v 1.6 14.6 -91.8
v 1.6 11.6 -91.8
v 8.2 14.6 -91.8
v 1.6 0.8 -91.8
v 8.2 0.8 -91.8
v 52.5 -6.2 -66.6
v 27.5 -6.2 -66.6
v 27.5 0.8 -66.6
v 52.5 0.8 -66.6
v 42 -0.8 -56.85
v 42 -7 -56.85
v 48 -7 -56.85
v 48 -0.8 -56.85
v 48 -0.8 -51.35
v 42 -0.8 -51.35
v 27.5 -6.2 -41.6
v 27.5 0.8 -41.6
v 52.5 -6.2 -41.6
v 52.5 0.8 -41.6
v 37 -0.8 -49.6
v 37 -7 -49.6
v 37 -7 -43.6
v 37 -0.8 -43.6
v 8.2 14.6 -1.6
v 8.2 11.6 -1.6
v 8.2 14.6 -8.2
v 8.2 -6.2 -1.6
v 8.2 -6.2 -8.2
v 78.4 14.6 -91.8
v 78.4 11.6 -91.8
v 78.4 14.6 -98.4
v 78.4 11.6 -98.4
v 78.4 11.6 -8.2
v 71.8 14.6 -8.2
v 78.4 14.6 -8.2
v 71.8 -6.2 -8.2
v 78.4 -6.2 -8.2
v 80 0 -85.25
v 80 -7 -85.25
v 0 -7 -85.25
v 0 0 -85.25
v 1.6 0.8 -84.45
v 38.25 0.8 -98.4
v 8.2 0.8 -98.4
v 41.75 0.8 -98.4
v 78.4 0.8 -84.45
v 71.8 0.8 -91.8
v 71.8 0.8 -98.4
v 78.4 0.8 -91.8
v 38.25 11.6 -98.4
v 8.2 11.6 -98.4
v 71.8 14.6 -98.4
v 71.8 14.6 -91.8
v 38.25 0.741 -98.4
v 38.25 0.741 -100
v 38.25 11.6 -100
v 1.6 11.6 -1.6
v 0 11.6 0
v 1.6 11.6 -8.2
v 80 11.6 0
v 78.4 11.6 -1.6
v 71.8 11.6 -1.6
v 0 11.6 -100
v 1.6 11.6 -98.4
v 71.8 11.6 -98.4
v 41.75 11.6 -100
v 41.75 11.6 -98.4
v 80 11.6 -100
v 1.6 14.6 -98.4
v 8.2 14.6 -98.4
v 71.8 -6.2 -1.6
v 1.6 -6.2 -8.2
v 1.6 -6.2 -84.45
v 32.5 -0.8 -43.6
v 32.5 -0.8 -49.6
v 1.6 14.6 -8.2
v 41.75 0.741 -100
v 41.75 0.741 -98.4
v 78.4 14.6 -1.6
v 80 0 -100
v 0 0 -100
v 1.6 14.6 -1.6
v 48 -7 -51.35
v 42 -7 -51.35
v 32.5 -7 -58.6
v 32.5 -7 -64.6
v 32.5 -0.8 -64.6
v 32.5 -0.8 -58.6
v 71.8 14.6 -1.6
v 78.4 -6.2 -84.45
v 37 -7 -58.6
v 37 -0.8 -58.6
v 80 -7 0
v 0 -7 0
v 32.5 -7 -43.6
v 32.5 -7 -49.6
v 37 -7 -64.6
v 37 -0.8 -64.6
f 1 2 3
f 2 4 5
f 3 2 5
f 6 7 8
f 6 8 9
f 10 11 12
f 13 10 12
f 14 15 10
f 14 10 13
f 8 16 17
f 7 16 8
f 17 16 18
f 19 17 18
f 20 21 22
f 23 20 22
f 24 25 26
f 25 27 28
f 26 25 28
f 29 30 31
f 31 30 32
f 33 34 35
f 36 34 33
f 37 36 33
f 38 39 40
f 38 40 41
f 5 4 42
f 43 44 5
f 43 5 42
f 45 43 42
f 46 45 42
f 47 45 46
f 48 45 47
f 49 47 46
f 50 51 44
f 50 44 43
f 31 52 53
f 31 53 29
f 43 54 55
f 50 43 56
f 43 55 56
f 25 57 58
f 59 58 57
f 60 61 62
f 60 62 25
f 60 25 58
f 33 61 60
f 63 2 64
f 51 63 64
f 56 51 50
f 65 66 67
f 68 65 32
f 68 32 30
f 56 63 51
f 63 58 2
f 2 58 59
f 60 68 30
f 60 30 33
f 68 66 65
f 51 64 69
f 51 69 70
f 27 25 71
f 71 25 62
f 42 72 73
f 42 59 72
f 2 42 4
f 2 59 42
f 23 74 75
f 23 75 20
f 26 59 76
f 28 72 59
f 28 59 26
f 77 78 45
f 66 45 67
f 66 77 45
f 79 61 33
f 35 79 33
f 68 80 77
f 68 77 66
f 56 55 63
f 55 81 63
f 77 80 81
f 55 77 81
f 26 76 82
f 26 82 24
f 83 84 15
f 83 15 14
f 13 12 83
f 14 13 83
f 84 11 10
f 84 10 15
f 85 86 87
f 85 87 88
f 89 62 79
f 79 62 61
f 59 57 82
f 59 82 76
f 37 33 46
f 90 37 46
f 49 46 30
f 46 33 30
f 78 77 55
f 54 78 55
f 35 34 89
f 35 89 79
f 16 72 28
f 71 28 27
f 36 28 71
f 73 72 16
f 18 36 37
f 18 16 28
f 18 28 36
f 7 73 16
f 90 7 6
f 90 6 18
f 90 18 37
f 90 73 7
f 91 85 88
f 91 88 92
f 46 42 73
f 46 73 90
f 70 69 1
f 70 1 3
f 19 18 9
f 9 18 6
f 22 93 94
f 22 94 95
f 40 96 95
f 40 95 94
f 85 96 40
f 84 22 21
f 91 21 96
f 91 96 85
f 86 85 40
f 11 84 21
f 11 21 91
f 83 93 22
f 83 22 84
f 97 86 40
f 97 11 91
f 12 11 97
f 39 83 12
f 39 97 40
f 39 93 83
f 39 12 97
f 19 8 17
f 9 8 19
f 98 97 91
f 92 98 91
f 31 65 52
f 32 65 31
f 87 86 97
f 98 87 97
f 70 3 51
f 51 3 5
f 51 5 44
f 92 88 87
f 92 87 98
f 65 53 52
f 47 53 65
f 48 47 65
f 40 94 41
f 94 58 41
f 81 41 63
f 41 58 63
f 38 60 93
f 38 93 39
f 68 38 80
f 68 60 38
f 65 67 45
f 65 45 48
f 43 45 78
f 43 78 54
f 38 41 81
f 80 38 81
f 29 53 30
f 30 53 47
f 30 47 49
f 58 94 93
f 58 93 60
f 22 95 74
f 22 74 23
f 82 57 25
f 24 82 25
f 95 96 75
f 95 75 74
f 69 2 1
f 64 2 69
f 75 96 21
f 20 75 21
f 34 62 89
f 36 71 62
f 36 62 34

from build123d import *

# Parameters (mm, degrees)
SKETCH5_W           = 100
SKETCH5_H           = 11.6
BOSS_EXTRUDE3_DEPTH = 80
SKETCH6_W           = 85.25
SKETCH6_H           = 7
BOSS_EXTRUDE4_DEPTH = 80
SKETCH7_W           = 76.8
SKETCH7_H           = 96.8
CUT_EXTRUDE1_DEPTH  = 10.8
SKETCH8_W           = 76.8
SKETCH8_H           = 82.85
CUT_EXTRUDE2_DEPTH  = 7
SKETCH10_W          = 6.6
SKETCH10_H          = 6.6
BOSS_EXTRUDE5_DEPTH = 17.8
SKETCH12_W          = 6.6
SKETCH12_H          = 6.6
BOSS_EXTRUDE6_DEPTH = 10.8
SKETCH15_W          = 3.5
SKETCH15_H          = 10.858624792
CUT_EXTRUDE4_DEPTH  = 1.6
SKETCH16_W          = 6.6
SKETCH16_H          = 6.6
BOSS_EXTRUDE8_DEPTH = 3
SKETCH18_W          = 25
SKETCH18_H          = 25
BOSS_EXTRUDE9_DEPTH = 7
SKETCH19_W          = 4.5
SKETCH19_H          = 6
SKETCH19_W_2        = 6
SKETCH19_H_2        = 5.5
CUT_EXTRUDE5_DEPTH  = 6.2


with BuildPart() as part:
    # Sketch5 → Boss-Extrude3 (new body)
    with BuildSketch(Plane(origin=(0, 0, 0), x_dir=(0, 0, -1), z_dir=(1, 0, 0))):
        with Locations((50, 5.8)):
            Rectangle(SKETCH5_W, SKETCH5_H)
    extrude(amount=BOSS_EXTRUDE3_DEPTH)

    # Sketch7 → Cut-Extrude1 (cut)
    with BuildSketch(Plane(origin=(0, 11.6, 0), x_dir=(1, 0, 0), z_dir=(0, 1, 0))):
        with Locations((40, 50)):
            Rectangle(SKETCH7_W, SKETCH7_H)
    extrude(amount=-CUT_EXTRUDE1_DEPTH, mode=Mode.SUBTRACT)


with BuildPart() as body_2:
    # Sketch6 → Boss-Extrude4 (new body)
    with BuildSketch(Plane(origin=(80, 0, 0), x_dir=(0, 0, -1), z_dir=(1, 0, 0))):
        with Locations((42.625, -3.5)):
            Rectangle(SKETCH6_W, SKETCH6_H)
    extrude(amount=-BOSS_EXTRUDE4_DEPTH)


with BuildPart() as cut_extrude2_tool:
    # Sketch8 → Cut-Extrude2 (new body)
    with BuildSketch(Plane(origin=(0, 0.8, 0), x_dir=(1, 0, 0), z_dir=(0, 1, 0))):
        with Locations((40, 43.025)):
            Rectangle(SKETCH8_W, SKETCH8_H)
    extrude(amount=-CUT_EXTRUDE2_DEPTH)


with BuildPart() as part_1:
    add(part.part)

    # Cut-Extrude2: cut by cut_extrude2_tool
    add(cut_extrude2_tool.part, mode=Mode.SUBTRACT)



with BuildPart() as body_2_1:
    add(body_2.part)

    # Cut-Extrude2: cut by cut_extrude2_tool
    add(cut_extrude2_tool.part, mode=Mode.SUBTRACT)


with BuildPart() as part_2:
    add(part_1.part)

    add(body_2_1.part)  # Boss-Extrude5 merges body 2
    # Sketch10 → Boss-Extrude5 (add)
    with BuildSketch(Plane(origin=(0, -6.2, 0), x_dir=(1, 0, 0), z_dir=(0, 1, 0))):
        with Locations((4.9, 4.9)):
            Rectangle(SKETCH10_W, SKETCH10_H)
        with Locations((75.1, 4.9)):
            Rectangle(SKETCH10_W, SKETCH10_H)
    extrude(amount=BOSS_EXTRUDE5_DEPTH)

    # Sketch12 → Boss-Extrude6 (add)
    with BuildSketch(Plane(origin=(0, 0.8, 0), x_dir=(1, 0, 0), z_dir=(0, 1, 0))):
        with Locations((4.9, 95.1)):
            Rectangle(SKETCH12_W, SKETCH12_H)
        with Locations((75.1, 95.1)):
            Rectangle(SKETCH12_W, SKETCH12_H)
    extrude(amount=BOSS_EXTRUDE6_DEPTH)

    # Sketch15 → Cut-Extrude4 (cut)
    with BuildSketch(Plane(origin=(0, 0, -100), x_dir=(-1, 0, 0), z_dir=(0, 0, -1))):
        with Locations((-40, 6.170687604)):
            Rectangle(SKETCH15_W, SKETCH15_H)
    extrude(amount=-CUT_EXTRUDE4_DEPTH, mode=Mode.SUBTRACT)

    # Sketch16 → Boss-Extrude8 (add)
    with BuildSketch(Plane(origin=(0, 11.6, 0), x_dir=(1, 0, 0), z_dir=(0, 1, 0))):
        with Locations((4.9, 95.1)):
            Rectangle(SKETCH16_W, SKETCH16_H)
        with Locations((75.1, 4.9)):
            Rectangle(SKETCH16_W, SKETCH16_H)
        with Locations((4.9, 4.9)):
            Rectangle(SKETCH16_W, SKETCH16_H)
        with Locations((75.1, 95.1)):
            Rectangle(SKETCH16_W, SKETCH16_H)
    extrude(amount=BOSS_EXTRUDE8_DEPTH)

    # Sketch18 → Boss-Extrude9 (add)
    with BuildSketch(Plane(origin=(0, -6.2, 0), x_dir=(1, 0, 0), z_dir=(0, 1, 0))):
        with Locations((40, 54.1)):
            Rectangle(SKETCH18_W, SKETCH18_H)
    extrude(amount=BOSS_EXTRUDE9_DEPTH)

    # Sketch19 → Cut-Extrude5 (cut)
    with BuildSketch(Plane.XZ.offset(7)):
        with Locations((34.75, -46.6)):
            Rectangle(SKETCH19_W, SKETCH19_H)
        with Locations((34.75, -61.6)):
            Rectangle(SKETCH19_W, SKETCH19_H)
        with Locations((45, -54.1)):
            Rectangle(SKETCH19_W_2, SKETCH19_H_2)
    extrude(amount=-CUT_EXTRUDE5_DEPTH, mode=Mode.SUBTRACT)


solid = part_2.part
